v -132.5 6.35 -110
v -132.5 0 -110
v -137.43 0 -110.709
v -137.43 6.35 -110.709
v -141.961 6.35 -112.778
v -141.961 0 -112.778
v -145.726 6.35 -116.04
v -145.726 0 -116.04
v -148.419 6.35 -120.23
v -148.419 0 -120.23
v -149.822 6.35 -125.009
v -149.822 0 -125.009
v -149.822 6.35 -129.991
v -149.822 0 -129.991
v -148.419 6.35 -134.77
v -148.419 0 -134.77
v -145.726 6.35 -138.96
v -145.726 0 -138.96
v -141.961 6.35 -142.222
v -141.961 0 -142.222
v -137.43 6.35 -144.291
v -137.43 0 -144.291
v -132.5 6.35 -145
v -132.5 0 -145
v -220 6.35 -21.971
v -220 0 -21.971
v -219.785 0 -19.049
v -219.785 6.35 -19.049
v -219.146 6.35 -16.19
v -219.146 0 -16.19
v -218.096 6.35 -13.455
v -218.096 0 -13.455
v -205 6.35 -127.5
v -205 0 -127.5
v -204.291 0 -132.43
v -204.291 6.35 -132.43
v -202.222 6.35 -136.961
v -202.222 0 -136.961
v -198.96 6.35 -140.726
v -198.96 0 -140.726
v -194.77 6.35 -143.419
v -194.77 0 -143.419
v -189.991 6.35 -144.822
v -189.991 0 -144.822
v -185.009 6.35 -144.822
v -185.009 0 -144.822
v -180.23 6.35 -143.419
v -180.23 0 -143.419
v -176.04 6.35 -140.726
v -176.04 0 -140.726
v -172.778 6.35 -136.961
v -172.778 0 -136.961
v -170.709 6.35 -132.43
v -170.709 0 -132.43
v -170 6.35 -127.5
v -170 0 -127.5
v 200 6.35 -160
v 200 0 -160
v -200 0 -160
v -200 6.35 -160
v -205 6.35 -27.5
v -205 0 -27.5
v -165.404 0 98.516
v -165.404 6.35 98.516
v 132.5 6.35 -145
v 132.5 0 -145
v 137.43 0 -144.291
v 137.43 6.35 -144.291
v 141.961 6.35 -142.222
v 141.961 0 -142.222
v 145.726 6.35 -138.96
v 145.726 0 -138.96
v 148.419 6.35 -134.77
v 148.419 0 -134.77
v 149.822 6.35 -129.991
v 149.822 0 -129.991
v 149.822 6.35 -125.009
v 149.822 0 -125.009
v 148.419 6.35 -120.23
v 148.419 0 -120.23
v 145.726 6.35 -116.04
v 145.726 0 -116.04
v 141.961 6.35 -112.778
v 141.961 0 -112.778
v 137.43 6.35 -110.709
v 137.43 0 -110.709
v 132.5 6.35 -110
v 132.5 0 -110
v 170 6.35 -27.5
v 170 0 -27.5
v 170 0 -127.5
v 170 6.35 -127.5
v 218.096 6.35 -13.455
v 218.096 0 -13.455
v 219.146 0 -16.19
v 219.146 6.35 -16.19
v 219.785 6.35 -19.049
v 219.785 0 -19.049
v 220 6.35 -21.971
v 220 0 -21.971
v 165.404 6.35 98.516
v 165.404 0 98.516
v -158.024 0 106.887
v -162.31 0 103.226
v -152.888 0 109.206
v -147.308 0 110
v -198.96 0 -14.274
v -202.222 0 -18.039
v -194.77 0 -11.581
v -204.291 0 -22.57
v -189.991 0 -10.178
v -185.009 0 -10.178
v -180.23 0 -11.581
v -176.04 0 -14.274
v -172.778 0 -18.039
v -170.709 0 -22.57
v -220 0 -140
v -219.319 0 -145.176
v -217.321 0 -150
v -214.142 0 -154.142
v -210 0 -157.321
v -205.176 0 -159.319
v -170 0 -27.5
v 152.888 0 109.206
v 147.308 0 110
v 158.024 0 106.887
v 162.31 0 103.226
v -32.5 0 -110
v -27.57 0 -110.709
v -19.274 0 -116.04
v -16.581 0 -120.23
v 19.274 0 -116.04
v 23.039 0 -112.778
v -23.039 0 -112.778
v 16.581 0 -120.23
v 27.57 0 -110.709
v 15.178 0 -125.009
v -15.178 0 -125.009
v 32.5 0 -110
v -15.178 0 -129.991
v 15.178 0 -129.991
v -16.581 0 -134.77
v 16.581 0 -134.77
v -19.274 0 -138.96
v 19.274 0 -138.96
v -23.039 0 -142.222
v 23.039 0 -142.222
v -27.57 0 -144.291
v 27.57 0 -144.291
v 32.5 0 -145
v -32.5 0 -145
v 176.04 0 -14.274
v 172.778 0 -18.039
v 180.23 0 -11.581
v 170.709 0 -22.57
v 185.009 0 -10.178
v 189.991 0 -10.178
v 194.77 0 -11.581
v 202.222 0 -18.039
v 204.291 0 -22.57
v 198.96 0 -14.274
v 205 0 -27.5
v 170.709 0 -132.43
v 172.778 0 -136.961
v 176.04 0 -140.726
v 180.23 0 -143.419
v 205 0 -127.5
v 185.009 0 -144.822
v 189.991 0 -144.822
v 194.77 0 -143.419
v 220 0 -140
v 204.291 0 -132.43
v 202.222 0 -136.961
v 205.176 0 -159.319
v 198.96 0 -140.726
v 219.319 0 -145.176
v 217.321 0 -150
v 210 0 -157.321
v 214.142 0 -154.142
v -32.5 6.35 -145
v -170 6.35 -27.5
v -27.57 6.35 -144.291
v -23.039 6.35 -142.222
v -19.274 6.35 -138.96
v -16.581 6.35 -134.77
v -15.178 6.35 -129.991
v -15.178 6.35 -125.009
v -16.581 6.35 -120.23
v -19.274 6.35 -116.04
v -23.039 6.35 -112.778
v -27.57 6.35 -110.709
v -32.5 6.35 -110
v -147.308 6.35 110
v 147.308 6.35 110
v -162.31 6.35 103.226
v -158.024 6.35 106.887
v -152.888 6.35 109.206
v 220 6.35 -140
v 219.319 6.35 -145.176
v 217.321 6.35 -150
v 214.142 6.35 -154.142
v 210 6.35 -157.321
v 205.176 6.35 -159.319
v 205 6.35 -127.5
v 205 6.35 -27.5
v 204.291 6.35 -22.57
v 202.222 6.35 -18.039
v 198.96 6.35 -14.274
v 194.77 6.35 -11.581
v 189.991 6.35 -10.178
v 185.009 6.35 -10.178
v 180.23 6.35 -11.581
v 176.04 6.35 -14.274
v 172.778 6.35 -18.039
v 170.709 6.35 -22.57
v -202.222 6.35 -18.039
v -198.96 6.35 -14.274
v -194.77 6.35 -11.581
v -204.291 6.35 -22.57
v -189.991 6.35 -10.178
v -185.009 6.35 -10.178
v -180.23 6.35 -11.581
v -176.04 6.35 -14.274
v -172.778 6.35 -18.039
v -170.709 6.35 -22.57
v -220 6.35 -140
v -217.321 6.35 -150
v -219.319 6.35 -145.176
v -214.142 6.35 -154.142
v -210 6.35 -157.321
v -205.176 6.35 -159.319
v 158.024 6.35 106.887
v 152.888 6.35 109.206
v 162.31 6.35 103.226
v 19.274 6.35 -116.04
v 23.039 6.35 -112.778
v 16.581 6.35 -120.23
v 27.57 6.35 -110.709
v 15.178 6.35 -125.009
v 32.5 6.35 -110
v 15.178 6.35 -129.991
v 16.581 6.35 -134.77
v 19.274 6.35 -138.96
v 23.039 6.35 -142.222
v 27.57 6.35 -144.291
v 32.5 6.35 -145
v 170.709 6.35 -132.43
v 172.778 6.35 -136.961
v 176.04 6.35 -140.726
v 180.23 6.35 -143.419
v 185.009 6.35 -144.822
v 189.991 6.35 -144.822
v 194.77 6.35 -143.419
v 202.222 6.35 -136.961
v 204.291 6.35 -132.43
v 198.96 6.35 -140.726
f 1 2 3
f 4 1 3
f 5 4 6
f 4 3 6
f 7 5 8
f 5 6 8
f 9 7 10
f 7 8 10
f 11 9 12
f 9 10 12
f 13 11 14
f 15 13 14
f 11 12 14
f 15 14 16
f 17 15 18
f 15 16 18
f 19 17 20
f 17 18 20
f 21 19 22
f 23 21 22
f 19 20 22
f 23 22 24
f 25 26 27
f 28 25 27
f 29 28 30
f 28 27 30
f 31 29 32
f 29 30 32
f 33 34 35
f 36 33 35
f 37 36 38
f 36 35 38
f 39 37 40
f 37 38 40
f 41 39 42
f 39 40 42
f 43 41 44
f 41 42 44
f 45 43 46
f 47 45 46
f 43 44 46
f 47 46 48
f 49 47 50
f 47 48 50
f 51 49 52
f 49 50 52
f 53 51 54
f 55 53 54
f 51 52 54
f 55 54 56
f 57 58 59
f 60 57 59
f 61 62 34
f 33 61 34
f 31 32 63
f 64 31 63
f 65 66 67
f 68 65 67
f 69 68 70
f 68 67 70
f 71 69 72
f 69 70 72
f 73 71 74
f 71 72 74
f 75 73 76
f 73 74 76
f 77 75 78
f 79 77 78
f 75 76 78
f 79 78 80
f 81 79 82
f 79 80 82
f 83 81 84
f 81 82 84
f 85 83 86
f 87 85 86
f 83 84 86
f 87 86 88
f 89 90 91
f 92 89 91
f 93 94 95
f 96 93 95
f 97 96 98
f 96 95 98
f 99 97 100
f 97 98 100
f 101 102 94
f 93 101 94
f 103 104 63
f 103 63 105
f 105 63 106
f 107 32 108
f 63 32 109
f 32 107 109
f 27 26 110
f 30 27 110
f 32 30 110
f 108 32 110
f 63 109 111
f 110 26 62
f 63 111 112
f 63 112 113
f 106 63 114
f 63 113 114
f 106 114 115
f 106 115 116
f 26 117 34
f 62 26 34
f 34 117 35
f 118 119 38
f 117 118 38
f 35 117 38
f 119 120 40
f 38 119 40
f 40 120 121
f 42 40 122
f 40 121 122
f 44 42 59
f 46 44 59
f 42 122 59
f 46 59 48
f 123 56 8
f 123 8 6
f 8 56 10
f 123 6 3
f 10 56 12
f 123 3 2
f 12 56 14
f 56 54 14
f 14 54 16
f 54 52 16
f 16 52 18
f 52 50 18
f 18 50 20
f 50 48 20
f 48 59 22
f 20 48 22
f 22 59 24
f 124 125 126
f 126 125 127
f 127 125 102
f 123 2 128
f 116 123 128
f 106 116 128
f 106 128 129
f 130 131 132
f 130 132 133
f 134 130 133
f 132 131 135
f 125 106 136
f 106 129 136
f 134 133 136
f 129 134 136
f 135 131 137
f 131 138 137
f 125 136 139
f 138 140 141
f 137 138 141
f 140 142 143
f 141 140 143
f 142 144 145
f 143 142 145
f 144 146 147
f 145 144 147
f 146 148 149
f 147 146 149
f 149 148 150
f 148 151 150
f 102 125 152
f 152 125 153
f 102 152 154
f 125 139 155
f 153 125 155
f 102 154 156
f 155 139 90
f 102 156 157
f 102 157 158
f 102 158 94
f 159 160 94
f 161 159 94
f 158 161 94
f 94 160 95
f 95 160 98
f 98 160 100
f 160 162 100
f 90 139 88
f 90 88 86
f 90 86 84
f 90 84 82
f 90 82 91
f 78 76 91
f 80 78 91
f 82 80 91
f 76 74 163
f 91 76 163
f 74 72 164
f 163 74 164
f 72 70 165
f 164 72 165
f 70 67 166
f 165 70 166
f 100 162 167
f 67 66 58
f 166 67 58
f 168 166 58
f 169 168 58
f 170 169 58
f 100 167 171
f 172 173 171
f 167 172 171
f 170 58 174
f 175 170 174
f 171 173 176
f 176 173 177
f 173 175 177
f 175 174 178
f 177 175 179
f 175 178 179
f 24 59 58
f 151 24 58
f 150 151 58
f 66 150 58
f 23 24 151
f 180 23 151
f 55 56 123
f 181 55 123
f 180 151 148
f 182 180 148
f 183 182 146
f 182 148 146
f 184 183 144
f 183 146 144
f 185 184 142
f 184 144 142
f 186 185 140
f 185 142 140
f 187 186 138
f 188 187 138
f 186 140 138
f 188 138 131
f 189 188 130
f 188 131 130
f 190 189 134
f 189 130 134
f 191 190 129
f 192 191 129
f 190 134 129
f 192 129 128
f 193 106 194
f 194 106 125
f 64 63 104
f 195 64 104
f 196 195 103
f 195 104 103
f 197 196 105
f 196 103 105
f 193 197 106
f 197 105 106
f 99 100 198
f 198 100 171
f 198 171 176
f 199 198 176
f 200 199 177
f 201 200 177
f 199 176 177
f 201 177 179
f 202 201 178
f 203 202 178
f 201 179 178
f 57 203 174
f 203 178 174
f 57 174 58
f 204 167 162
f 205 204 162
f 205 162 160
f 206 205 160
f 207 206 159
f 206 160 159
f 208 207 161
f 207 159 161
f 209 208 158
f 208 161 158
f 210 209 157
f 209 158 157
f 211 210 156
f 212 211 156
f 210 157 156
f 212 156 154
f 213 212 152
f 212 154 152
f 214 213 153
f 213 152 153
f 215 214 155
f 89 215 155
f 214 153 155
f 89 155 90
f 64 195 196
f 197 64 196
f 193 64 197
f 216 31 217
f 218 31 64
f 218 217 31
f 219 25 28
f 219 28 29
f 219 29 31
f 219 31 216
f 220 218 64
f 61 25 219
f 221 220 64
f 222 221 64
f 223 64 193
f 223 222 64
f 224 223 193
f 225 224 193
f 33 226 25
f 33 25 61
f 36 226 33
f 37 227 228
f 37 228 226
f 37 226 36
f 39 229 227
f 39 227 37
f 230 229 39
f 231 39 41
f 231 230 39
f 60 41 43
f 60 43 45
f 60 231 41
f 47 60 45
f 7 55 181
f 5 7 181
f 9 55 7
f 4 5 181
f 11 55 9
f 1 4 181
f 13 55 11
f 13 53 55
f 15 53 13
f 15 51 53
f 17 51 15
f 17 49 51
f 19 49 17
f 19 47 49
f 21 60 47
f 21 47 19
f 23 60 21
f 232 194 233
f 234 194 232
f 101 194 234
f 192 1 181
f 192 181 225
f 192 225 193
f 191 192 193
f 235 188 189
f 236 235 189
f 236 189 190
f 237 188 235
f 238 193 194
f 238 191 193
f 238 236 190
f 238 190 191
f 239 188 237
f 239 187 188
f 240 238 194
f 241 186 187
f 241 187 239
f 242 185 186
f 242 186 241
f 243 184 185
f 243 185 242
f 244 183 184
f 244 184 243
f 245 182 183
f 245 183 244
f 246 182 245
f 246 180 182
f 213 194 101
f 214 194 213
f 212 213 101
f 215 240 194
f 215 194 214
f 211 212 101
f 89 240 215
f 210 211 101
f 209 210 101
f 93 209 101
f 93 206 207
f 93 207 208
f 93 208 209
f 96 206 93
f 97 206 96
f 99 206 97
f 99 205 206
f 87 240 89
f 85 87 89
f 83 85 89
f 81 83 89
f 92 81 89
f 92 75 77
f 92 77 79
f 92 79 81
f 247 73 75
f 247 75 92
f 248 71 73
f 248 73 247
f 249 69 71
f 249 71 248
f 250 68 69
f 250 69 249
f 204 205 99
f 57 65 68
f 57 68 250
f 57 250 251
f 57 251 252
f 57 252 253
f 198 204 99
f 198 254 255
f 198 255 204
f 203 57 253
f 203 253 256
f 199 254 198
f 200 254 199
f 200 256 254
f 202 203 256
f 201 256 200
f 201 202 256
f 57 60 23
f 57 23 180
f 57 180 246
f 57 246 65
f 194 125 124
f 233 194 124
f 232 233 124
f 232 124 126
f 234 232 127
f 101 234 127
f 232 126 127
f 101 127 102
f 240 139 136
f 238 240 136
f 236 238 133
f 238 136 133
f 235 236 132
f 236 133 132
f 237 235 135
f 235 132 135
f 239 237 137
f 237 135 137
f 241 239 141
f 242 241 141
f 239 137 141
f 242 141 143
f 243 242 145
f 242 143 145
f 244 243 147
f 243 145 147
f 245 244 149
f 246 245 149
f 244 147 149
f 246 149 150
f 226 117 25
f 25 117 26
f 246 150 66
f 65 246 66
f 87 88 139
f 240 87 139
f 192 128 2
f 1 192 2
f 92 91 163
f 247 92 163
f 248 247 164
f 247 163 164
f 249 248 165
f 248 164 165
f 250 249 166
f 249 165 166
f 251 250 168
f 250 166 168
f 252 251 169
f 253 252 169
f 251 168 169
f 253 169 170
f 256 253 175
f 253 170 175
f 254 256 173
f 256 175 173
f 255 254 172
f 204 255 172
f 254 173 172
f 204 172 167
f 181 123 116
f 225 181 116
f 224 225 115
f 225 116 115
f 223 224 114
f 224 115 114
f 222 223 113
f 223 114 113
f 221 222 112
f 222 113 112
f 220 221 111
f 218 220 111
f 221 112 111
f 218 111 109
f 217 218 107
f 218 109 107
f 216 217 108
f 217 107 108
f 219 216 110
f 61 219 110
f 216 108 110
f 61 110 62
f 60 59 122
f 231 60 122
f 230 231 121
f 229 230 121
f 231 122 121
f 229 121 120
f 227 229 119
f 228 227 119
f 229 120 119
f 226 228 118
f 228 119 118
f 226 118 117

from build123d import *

# Parameters (mm, degrees)
BOSS_EXTRUDE1_DEPTH = 6.35


with BuildPart() as part:
    # Sketch1 → Boss-Extrude1 (new body)
    with BuildSketch(Plane(origin=(0, 0, 0), x_dir=(1, 0, 0), z_dir=(0, 1, 0))):
        with BuildLine():
            Line((-147.307889143, -110), (147.307889143, -110))
            ThreePointArc((147.307889143, -110), (158.024259459, -106.886663592), (165.404263187, -98.515940727))
            Line((165.404263187, -98.515940727), (218.096374044, 13.454794844))
            ThreePointArc((218.096374044, 13.454794844), (219.518292457, 17.607679352), (220, 21.97073557))
            Line((220, 21.97073557), (220, 140))
            ThreePointArc((220, 140), (214.142135624, 154.142135624), (200, 160))
            Line((200, 160), (-200, 160))
            ThreePointArc((-200, 160), (-214.142135624, 154.142135624), (-220, 140))
            Line((-220, 140), (-220, 21.97073557))
            ThreePointArc((-220, 21.97073557), (-219.518292457, 17.607679352), (-218.096374044, 13.454794844))
            Line((-218.096374044, 13.454794844), (-165.404263187, -98.515940727))
            ThreePointArc((-165.404263187, -98.515940727), (-158.024259459, -106.886663592), (-147.307889143, -110))
        make_face()
        with BuildLine():
            Line((-170, 127.5), (-170, 27.5))
            ThreePointArc((-170, 27.5), (-187.5, 10), (-205, 27.5))
            Line((-205, 27.5), (-205, 127.5))
            ThreePointArc((-205, 127.5), (-187.5, 145), (-170, 127.5))
        make_face(mode=Mode.SUBTRACT)
        with BuildLine():
            Line((-132.5, 145), (-32.5, 145))
            ThreePointArc((-32.5, 145), (-15, 127.5), (-32.5, 110))
            Line((-32.5, 110), (-132.5, 110))
            ThreePointArc((-132.5, 110), (-150, 127.5), (-132.5, 145))
        make_face(mode=Mode.SUBTRACT)
        with BuildLine():
            Line((205, 127.5), (205, 27.5))
            ThreePointArc((205, 27.5), (187.5, 10), (170, 27.5))
            Line((170, 27.5), (170, 127.5))
            ThreePointArc((170, 127.5), (187.5, 145), (205, 127.5))
        make_face(mode=Mode.SUBTRACT)
        with BuildLine():
            Line((32.5, 145), (132.5, 145))
            ThreePointArc((132.5, 145), (150, 127.5), (132.5, 110))
            Line((132.5, 110), (32.5, 110))
            ThreePointArc((32.5, 110), (15, 127.5), (32.5, 145))
        make_face(mode=Mode.SUBTRACT)
    extrude(amount=BOSS_EXTRUDE1_DEPTH)


solid = part.part
